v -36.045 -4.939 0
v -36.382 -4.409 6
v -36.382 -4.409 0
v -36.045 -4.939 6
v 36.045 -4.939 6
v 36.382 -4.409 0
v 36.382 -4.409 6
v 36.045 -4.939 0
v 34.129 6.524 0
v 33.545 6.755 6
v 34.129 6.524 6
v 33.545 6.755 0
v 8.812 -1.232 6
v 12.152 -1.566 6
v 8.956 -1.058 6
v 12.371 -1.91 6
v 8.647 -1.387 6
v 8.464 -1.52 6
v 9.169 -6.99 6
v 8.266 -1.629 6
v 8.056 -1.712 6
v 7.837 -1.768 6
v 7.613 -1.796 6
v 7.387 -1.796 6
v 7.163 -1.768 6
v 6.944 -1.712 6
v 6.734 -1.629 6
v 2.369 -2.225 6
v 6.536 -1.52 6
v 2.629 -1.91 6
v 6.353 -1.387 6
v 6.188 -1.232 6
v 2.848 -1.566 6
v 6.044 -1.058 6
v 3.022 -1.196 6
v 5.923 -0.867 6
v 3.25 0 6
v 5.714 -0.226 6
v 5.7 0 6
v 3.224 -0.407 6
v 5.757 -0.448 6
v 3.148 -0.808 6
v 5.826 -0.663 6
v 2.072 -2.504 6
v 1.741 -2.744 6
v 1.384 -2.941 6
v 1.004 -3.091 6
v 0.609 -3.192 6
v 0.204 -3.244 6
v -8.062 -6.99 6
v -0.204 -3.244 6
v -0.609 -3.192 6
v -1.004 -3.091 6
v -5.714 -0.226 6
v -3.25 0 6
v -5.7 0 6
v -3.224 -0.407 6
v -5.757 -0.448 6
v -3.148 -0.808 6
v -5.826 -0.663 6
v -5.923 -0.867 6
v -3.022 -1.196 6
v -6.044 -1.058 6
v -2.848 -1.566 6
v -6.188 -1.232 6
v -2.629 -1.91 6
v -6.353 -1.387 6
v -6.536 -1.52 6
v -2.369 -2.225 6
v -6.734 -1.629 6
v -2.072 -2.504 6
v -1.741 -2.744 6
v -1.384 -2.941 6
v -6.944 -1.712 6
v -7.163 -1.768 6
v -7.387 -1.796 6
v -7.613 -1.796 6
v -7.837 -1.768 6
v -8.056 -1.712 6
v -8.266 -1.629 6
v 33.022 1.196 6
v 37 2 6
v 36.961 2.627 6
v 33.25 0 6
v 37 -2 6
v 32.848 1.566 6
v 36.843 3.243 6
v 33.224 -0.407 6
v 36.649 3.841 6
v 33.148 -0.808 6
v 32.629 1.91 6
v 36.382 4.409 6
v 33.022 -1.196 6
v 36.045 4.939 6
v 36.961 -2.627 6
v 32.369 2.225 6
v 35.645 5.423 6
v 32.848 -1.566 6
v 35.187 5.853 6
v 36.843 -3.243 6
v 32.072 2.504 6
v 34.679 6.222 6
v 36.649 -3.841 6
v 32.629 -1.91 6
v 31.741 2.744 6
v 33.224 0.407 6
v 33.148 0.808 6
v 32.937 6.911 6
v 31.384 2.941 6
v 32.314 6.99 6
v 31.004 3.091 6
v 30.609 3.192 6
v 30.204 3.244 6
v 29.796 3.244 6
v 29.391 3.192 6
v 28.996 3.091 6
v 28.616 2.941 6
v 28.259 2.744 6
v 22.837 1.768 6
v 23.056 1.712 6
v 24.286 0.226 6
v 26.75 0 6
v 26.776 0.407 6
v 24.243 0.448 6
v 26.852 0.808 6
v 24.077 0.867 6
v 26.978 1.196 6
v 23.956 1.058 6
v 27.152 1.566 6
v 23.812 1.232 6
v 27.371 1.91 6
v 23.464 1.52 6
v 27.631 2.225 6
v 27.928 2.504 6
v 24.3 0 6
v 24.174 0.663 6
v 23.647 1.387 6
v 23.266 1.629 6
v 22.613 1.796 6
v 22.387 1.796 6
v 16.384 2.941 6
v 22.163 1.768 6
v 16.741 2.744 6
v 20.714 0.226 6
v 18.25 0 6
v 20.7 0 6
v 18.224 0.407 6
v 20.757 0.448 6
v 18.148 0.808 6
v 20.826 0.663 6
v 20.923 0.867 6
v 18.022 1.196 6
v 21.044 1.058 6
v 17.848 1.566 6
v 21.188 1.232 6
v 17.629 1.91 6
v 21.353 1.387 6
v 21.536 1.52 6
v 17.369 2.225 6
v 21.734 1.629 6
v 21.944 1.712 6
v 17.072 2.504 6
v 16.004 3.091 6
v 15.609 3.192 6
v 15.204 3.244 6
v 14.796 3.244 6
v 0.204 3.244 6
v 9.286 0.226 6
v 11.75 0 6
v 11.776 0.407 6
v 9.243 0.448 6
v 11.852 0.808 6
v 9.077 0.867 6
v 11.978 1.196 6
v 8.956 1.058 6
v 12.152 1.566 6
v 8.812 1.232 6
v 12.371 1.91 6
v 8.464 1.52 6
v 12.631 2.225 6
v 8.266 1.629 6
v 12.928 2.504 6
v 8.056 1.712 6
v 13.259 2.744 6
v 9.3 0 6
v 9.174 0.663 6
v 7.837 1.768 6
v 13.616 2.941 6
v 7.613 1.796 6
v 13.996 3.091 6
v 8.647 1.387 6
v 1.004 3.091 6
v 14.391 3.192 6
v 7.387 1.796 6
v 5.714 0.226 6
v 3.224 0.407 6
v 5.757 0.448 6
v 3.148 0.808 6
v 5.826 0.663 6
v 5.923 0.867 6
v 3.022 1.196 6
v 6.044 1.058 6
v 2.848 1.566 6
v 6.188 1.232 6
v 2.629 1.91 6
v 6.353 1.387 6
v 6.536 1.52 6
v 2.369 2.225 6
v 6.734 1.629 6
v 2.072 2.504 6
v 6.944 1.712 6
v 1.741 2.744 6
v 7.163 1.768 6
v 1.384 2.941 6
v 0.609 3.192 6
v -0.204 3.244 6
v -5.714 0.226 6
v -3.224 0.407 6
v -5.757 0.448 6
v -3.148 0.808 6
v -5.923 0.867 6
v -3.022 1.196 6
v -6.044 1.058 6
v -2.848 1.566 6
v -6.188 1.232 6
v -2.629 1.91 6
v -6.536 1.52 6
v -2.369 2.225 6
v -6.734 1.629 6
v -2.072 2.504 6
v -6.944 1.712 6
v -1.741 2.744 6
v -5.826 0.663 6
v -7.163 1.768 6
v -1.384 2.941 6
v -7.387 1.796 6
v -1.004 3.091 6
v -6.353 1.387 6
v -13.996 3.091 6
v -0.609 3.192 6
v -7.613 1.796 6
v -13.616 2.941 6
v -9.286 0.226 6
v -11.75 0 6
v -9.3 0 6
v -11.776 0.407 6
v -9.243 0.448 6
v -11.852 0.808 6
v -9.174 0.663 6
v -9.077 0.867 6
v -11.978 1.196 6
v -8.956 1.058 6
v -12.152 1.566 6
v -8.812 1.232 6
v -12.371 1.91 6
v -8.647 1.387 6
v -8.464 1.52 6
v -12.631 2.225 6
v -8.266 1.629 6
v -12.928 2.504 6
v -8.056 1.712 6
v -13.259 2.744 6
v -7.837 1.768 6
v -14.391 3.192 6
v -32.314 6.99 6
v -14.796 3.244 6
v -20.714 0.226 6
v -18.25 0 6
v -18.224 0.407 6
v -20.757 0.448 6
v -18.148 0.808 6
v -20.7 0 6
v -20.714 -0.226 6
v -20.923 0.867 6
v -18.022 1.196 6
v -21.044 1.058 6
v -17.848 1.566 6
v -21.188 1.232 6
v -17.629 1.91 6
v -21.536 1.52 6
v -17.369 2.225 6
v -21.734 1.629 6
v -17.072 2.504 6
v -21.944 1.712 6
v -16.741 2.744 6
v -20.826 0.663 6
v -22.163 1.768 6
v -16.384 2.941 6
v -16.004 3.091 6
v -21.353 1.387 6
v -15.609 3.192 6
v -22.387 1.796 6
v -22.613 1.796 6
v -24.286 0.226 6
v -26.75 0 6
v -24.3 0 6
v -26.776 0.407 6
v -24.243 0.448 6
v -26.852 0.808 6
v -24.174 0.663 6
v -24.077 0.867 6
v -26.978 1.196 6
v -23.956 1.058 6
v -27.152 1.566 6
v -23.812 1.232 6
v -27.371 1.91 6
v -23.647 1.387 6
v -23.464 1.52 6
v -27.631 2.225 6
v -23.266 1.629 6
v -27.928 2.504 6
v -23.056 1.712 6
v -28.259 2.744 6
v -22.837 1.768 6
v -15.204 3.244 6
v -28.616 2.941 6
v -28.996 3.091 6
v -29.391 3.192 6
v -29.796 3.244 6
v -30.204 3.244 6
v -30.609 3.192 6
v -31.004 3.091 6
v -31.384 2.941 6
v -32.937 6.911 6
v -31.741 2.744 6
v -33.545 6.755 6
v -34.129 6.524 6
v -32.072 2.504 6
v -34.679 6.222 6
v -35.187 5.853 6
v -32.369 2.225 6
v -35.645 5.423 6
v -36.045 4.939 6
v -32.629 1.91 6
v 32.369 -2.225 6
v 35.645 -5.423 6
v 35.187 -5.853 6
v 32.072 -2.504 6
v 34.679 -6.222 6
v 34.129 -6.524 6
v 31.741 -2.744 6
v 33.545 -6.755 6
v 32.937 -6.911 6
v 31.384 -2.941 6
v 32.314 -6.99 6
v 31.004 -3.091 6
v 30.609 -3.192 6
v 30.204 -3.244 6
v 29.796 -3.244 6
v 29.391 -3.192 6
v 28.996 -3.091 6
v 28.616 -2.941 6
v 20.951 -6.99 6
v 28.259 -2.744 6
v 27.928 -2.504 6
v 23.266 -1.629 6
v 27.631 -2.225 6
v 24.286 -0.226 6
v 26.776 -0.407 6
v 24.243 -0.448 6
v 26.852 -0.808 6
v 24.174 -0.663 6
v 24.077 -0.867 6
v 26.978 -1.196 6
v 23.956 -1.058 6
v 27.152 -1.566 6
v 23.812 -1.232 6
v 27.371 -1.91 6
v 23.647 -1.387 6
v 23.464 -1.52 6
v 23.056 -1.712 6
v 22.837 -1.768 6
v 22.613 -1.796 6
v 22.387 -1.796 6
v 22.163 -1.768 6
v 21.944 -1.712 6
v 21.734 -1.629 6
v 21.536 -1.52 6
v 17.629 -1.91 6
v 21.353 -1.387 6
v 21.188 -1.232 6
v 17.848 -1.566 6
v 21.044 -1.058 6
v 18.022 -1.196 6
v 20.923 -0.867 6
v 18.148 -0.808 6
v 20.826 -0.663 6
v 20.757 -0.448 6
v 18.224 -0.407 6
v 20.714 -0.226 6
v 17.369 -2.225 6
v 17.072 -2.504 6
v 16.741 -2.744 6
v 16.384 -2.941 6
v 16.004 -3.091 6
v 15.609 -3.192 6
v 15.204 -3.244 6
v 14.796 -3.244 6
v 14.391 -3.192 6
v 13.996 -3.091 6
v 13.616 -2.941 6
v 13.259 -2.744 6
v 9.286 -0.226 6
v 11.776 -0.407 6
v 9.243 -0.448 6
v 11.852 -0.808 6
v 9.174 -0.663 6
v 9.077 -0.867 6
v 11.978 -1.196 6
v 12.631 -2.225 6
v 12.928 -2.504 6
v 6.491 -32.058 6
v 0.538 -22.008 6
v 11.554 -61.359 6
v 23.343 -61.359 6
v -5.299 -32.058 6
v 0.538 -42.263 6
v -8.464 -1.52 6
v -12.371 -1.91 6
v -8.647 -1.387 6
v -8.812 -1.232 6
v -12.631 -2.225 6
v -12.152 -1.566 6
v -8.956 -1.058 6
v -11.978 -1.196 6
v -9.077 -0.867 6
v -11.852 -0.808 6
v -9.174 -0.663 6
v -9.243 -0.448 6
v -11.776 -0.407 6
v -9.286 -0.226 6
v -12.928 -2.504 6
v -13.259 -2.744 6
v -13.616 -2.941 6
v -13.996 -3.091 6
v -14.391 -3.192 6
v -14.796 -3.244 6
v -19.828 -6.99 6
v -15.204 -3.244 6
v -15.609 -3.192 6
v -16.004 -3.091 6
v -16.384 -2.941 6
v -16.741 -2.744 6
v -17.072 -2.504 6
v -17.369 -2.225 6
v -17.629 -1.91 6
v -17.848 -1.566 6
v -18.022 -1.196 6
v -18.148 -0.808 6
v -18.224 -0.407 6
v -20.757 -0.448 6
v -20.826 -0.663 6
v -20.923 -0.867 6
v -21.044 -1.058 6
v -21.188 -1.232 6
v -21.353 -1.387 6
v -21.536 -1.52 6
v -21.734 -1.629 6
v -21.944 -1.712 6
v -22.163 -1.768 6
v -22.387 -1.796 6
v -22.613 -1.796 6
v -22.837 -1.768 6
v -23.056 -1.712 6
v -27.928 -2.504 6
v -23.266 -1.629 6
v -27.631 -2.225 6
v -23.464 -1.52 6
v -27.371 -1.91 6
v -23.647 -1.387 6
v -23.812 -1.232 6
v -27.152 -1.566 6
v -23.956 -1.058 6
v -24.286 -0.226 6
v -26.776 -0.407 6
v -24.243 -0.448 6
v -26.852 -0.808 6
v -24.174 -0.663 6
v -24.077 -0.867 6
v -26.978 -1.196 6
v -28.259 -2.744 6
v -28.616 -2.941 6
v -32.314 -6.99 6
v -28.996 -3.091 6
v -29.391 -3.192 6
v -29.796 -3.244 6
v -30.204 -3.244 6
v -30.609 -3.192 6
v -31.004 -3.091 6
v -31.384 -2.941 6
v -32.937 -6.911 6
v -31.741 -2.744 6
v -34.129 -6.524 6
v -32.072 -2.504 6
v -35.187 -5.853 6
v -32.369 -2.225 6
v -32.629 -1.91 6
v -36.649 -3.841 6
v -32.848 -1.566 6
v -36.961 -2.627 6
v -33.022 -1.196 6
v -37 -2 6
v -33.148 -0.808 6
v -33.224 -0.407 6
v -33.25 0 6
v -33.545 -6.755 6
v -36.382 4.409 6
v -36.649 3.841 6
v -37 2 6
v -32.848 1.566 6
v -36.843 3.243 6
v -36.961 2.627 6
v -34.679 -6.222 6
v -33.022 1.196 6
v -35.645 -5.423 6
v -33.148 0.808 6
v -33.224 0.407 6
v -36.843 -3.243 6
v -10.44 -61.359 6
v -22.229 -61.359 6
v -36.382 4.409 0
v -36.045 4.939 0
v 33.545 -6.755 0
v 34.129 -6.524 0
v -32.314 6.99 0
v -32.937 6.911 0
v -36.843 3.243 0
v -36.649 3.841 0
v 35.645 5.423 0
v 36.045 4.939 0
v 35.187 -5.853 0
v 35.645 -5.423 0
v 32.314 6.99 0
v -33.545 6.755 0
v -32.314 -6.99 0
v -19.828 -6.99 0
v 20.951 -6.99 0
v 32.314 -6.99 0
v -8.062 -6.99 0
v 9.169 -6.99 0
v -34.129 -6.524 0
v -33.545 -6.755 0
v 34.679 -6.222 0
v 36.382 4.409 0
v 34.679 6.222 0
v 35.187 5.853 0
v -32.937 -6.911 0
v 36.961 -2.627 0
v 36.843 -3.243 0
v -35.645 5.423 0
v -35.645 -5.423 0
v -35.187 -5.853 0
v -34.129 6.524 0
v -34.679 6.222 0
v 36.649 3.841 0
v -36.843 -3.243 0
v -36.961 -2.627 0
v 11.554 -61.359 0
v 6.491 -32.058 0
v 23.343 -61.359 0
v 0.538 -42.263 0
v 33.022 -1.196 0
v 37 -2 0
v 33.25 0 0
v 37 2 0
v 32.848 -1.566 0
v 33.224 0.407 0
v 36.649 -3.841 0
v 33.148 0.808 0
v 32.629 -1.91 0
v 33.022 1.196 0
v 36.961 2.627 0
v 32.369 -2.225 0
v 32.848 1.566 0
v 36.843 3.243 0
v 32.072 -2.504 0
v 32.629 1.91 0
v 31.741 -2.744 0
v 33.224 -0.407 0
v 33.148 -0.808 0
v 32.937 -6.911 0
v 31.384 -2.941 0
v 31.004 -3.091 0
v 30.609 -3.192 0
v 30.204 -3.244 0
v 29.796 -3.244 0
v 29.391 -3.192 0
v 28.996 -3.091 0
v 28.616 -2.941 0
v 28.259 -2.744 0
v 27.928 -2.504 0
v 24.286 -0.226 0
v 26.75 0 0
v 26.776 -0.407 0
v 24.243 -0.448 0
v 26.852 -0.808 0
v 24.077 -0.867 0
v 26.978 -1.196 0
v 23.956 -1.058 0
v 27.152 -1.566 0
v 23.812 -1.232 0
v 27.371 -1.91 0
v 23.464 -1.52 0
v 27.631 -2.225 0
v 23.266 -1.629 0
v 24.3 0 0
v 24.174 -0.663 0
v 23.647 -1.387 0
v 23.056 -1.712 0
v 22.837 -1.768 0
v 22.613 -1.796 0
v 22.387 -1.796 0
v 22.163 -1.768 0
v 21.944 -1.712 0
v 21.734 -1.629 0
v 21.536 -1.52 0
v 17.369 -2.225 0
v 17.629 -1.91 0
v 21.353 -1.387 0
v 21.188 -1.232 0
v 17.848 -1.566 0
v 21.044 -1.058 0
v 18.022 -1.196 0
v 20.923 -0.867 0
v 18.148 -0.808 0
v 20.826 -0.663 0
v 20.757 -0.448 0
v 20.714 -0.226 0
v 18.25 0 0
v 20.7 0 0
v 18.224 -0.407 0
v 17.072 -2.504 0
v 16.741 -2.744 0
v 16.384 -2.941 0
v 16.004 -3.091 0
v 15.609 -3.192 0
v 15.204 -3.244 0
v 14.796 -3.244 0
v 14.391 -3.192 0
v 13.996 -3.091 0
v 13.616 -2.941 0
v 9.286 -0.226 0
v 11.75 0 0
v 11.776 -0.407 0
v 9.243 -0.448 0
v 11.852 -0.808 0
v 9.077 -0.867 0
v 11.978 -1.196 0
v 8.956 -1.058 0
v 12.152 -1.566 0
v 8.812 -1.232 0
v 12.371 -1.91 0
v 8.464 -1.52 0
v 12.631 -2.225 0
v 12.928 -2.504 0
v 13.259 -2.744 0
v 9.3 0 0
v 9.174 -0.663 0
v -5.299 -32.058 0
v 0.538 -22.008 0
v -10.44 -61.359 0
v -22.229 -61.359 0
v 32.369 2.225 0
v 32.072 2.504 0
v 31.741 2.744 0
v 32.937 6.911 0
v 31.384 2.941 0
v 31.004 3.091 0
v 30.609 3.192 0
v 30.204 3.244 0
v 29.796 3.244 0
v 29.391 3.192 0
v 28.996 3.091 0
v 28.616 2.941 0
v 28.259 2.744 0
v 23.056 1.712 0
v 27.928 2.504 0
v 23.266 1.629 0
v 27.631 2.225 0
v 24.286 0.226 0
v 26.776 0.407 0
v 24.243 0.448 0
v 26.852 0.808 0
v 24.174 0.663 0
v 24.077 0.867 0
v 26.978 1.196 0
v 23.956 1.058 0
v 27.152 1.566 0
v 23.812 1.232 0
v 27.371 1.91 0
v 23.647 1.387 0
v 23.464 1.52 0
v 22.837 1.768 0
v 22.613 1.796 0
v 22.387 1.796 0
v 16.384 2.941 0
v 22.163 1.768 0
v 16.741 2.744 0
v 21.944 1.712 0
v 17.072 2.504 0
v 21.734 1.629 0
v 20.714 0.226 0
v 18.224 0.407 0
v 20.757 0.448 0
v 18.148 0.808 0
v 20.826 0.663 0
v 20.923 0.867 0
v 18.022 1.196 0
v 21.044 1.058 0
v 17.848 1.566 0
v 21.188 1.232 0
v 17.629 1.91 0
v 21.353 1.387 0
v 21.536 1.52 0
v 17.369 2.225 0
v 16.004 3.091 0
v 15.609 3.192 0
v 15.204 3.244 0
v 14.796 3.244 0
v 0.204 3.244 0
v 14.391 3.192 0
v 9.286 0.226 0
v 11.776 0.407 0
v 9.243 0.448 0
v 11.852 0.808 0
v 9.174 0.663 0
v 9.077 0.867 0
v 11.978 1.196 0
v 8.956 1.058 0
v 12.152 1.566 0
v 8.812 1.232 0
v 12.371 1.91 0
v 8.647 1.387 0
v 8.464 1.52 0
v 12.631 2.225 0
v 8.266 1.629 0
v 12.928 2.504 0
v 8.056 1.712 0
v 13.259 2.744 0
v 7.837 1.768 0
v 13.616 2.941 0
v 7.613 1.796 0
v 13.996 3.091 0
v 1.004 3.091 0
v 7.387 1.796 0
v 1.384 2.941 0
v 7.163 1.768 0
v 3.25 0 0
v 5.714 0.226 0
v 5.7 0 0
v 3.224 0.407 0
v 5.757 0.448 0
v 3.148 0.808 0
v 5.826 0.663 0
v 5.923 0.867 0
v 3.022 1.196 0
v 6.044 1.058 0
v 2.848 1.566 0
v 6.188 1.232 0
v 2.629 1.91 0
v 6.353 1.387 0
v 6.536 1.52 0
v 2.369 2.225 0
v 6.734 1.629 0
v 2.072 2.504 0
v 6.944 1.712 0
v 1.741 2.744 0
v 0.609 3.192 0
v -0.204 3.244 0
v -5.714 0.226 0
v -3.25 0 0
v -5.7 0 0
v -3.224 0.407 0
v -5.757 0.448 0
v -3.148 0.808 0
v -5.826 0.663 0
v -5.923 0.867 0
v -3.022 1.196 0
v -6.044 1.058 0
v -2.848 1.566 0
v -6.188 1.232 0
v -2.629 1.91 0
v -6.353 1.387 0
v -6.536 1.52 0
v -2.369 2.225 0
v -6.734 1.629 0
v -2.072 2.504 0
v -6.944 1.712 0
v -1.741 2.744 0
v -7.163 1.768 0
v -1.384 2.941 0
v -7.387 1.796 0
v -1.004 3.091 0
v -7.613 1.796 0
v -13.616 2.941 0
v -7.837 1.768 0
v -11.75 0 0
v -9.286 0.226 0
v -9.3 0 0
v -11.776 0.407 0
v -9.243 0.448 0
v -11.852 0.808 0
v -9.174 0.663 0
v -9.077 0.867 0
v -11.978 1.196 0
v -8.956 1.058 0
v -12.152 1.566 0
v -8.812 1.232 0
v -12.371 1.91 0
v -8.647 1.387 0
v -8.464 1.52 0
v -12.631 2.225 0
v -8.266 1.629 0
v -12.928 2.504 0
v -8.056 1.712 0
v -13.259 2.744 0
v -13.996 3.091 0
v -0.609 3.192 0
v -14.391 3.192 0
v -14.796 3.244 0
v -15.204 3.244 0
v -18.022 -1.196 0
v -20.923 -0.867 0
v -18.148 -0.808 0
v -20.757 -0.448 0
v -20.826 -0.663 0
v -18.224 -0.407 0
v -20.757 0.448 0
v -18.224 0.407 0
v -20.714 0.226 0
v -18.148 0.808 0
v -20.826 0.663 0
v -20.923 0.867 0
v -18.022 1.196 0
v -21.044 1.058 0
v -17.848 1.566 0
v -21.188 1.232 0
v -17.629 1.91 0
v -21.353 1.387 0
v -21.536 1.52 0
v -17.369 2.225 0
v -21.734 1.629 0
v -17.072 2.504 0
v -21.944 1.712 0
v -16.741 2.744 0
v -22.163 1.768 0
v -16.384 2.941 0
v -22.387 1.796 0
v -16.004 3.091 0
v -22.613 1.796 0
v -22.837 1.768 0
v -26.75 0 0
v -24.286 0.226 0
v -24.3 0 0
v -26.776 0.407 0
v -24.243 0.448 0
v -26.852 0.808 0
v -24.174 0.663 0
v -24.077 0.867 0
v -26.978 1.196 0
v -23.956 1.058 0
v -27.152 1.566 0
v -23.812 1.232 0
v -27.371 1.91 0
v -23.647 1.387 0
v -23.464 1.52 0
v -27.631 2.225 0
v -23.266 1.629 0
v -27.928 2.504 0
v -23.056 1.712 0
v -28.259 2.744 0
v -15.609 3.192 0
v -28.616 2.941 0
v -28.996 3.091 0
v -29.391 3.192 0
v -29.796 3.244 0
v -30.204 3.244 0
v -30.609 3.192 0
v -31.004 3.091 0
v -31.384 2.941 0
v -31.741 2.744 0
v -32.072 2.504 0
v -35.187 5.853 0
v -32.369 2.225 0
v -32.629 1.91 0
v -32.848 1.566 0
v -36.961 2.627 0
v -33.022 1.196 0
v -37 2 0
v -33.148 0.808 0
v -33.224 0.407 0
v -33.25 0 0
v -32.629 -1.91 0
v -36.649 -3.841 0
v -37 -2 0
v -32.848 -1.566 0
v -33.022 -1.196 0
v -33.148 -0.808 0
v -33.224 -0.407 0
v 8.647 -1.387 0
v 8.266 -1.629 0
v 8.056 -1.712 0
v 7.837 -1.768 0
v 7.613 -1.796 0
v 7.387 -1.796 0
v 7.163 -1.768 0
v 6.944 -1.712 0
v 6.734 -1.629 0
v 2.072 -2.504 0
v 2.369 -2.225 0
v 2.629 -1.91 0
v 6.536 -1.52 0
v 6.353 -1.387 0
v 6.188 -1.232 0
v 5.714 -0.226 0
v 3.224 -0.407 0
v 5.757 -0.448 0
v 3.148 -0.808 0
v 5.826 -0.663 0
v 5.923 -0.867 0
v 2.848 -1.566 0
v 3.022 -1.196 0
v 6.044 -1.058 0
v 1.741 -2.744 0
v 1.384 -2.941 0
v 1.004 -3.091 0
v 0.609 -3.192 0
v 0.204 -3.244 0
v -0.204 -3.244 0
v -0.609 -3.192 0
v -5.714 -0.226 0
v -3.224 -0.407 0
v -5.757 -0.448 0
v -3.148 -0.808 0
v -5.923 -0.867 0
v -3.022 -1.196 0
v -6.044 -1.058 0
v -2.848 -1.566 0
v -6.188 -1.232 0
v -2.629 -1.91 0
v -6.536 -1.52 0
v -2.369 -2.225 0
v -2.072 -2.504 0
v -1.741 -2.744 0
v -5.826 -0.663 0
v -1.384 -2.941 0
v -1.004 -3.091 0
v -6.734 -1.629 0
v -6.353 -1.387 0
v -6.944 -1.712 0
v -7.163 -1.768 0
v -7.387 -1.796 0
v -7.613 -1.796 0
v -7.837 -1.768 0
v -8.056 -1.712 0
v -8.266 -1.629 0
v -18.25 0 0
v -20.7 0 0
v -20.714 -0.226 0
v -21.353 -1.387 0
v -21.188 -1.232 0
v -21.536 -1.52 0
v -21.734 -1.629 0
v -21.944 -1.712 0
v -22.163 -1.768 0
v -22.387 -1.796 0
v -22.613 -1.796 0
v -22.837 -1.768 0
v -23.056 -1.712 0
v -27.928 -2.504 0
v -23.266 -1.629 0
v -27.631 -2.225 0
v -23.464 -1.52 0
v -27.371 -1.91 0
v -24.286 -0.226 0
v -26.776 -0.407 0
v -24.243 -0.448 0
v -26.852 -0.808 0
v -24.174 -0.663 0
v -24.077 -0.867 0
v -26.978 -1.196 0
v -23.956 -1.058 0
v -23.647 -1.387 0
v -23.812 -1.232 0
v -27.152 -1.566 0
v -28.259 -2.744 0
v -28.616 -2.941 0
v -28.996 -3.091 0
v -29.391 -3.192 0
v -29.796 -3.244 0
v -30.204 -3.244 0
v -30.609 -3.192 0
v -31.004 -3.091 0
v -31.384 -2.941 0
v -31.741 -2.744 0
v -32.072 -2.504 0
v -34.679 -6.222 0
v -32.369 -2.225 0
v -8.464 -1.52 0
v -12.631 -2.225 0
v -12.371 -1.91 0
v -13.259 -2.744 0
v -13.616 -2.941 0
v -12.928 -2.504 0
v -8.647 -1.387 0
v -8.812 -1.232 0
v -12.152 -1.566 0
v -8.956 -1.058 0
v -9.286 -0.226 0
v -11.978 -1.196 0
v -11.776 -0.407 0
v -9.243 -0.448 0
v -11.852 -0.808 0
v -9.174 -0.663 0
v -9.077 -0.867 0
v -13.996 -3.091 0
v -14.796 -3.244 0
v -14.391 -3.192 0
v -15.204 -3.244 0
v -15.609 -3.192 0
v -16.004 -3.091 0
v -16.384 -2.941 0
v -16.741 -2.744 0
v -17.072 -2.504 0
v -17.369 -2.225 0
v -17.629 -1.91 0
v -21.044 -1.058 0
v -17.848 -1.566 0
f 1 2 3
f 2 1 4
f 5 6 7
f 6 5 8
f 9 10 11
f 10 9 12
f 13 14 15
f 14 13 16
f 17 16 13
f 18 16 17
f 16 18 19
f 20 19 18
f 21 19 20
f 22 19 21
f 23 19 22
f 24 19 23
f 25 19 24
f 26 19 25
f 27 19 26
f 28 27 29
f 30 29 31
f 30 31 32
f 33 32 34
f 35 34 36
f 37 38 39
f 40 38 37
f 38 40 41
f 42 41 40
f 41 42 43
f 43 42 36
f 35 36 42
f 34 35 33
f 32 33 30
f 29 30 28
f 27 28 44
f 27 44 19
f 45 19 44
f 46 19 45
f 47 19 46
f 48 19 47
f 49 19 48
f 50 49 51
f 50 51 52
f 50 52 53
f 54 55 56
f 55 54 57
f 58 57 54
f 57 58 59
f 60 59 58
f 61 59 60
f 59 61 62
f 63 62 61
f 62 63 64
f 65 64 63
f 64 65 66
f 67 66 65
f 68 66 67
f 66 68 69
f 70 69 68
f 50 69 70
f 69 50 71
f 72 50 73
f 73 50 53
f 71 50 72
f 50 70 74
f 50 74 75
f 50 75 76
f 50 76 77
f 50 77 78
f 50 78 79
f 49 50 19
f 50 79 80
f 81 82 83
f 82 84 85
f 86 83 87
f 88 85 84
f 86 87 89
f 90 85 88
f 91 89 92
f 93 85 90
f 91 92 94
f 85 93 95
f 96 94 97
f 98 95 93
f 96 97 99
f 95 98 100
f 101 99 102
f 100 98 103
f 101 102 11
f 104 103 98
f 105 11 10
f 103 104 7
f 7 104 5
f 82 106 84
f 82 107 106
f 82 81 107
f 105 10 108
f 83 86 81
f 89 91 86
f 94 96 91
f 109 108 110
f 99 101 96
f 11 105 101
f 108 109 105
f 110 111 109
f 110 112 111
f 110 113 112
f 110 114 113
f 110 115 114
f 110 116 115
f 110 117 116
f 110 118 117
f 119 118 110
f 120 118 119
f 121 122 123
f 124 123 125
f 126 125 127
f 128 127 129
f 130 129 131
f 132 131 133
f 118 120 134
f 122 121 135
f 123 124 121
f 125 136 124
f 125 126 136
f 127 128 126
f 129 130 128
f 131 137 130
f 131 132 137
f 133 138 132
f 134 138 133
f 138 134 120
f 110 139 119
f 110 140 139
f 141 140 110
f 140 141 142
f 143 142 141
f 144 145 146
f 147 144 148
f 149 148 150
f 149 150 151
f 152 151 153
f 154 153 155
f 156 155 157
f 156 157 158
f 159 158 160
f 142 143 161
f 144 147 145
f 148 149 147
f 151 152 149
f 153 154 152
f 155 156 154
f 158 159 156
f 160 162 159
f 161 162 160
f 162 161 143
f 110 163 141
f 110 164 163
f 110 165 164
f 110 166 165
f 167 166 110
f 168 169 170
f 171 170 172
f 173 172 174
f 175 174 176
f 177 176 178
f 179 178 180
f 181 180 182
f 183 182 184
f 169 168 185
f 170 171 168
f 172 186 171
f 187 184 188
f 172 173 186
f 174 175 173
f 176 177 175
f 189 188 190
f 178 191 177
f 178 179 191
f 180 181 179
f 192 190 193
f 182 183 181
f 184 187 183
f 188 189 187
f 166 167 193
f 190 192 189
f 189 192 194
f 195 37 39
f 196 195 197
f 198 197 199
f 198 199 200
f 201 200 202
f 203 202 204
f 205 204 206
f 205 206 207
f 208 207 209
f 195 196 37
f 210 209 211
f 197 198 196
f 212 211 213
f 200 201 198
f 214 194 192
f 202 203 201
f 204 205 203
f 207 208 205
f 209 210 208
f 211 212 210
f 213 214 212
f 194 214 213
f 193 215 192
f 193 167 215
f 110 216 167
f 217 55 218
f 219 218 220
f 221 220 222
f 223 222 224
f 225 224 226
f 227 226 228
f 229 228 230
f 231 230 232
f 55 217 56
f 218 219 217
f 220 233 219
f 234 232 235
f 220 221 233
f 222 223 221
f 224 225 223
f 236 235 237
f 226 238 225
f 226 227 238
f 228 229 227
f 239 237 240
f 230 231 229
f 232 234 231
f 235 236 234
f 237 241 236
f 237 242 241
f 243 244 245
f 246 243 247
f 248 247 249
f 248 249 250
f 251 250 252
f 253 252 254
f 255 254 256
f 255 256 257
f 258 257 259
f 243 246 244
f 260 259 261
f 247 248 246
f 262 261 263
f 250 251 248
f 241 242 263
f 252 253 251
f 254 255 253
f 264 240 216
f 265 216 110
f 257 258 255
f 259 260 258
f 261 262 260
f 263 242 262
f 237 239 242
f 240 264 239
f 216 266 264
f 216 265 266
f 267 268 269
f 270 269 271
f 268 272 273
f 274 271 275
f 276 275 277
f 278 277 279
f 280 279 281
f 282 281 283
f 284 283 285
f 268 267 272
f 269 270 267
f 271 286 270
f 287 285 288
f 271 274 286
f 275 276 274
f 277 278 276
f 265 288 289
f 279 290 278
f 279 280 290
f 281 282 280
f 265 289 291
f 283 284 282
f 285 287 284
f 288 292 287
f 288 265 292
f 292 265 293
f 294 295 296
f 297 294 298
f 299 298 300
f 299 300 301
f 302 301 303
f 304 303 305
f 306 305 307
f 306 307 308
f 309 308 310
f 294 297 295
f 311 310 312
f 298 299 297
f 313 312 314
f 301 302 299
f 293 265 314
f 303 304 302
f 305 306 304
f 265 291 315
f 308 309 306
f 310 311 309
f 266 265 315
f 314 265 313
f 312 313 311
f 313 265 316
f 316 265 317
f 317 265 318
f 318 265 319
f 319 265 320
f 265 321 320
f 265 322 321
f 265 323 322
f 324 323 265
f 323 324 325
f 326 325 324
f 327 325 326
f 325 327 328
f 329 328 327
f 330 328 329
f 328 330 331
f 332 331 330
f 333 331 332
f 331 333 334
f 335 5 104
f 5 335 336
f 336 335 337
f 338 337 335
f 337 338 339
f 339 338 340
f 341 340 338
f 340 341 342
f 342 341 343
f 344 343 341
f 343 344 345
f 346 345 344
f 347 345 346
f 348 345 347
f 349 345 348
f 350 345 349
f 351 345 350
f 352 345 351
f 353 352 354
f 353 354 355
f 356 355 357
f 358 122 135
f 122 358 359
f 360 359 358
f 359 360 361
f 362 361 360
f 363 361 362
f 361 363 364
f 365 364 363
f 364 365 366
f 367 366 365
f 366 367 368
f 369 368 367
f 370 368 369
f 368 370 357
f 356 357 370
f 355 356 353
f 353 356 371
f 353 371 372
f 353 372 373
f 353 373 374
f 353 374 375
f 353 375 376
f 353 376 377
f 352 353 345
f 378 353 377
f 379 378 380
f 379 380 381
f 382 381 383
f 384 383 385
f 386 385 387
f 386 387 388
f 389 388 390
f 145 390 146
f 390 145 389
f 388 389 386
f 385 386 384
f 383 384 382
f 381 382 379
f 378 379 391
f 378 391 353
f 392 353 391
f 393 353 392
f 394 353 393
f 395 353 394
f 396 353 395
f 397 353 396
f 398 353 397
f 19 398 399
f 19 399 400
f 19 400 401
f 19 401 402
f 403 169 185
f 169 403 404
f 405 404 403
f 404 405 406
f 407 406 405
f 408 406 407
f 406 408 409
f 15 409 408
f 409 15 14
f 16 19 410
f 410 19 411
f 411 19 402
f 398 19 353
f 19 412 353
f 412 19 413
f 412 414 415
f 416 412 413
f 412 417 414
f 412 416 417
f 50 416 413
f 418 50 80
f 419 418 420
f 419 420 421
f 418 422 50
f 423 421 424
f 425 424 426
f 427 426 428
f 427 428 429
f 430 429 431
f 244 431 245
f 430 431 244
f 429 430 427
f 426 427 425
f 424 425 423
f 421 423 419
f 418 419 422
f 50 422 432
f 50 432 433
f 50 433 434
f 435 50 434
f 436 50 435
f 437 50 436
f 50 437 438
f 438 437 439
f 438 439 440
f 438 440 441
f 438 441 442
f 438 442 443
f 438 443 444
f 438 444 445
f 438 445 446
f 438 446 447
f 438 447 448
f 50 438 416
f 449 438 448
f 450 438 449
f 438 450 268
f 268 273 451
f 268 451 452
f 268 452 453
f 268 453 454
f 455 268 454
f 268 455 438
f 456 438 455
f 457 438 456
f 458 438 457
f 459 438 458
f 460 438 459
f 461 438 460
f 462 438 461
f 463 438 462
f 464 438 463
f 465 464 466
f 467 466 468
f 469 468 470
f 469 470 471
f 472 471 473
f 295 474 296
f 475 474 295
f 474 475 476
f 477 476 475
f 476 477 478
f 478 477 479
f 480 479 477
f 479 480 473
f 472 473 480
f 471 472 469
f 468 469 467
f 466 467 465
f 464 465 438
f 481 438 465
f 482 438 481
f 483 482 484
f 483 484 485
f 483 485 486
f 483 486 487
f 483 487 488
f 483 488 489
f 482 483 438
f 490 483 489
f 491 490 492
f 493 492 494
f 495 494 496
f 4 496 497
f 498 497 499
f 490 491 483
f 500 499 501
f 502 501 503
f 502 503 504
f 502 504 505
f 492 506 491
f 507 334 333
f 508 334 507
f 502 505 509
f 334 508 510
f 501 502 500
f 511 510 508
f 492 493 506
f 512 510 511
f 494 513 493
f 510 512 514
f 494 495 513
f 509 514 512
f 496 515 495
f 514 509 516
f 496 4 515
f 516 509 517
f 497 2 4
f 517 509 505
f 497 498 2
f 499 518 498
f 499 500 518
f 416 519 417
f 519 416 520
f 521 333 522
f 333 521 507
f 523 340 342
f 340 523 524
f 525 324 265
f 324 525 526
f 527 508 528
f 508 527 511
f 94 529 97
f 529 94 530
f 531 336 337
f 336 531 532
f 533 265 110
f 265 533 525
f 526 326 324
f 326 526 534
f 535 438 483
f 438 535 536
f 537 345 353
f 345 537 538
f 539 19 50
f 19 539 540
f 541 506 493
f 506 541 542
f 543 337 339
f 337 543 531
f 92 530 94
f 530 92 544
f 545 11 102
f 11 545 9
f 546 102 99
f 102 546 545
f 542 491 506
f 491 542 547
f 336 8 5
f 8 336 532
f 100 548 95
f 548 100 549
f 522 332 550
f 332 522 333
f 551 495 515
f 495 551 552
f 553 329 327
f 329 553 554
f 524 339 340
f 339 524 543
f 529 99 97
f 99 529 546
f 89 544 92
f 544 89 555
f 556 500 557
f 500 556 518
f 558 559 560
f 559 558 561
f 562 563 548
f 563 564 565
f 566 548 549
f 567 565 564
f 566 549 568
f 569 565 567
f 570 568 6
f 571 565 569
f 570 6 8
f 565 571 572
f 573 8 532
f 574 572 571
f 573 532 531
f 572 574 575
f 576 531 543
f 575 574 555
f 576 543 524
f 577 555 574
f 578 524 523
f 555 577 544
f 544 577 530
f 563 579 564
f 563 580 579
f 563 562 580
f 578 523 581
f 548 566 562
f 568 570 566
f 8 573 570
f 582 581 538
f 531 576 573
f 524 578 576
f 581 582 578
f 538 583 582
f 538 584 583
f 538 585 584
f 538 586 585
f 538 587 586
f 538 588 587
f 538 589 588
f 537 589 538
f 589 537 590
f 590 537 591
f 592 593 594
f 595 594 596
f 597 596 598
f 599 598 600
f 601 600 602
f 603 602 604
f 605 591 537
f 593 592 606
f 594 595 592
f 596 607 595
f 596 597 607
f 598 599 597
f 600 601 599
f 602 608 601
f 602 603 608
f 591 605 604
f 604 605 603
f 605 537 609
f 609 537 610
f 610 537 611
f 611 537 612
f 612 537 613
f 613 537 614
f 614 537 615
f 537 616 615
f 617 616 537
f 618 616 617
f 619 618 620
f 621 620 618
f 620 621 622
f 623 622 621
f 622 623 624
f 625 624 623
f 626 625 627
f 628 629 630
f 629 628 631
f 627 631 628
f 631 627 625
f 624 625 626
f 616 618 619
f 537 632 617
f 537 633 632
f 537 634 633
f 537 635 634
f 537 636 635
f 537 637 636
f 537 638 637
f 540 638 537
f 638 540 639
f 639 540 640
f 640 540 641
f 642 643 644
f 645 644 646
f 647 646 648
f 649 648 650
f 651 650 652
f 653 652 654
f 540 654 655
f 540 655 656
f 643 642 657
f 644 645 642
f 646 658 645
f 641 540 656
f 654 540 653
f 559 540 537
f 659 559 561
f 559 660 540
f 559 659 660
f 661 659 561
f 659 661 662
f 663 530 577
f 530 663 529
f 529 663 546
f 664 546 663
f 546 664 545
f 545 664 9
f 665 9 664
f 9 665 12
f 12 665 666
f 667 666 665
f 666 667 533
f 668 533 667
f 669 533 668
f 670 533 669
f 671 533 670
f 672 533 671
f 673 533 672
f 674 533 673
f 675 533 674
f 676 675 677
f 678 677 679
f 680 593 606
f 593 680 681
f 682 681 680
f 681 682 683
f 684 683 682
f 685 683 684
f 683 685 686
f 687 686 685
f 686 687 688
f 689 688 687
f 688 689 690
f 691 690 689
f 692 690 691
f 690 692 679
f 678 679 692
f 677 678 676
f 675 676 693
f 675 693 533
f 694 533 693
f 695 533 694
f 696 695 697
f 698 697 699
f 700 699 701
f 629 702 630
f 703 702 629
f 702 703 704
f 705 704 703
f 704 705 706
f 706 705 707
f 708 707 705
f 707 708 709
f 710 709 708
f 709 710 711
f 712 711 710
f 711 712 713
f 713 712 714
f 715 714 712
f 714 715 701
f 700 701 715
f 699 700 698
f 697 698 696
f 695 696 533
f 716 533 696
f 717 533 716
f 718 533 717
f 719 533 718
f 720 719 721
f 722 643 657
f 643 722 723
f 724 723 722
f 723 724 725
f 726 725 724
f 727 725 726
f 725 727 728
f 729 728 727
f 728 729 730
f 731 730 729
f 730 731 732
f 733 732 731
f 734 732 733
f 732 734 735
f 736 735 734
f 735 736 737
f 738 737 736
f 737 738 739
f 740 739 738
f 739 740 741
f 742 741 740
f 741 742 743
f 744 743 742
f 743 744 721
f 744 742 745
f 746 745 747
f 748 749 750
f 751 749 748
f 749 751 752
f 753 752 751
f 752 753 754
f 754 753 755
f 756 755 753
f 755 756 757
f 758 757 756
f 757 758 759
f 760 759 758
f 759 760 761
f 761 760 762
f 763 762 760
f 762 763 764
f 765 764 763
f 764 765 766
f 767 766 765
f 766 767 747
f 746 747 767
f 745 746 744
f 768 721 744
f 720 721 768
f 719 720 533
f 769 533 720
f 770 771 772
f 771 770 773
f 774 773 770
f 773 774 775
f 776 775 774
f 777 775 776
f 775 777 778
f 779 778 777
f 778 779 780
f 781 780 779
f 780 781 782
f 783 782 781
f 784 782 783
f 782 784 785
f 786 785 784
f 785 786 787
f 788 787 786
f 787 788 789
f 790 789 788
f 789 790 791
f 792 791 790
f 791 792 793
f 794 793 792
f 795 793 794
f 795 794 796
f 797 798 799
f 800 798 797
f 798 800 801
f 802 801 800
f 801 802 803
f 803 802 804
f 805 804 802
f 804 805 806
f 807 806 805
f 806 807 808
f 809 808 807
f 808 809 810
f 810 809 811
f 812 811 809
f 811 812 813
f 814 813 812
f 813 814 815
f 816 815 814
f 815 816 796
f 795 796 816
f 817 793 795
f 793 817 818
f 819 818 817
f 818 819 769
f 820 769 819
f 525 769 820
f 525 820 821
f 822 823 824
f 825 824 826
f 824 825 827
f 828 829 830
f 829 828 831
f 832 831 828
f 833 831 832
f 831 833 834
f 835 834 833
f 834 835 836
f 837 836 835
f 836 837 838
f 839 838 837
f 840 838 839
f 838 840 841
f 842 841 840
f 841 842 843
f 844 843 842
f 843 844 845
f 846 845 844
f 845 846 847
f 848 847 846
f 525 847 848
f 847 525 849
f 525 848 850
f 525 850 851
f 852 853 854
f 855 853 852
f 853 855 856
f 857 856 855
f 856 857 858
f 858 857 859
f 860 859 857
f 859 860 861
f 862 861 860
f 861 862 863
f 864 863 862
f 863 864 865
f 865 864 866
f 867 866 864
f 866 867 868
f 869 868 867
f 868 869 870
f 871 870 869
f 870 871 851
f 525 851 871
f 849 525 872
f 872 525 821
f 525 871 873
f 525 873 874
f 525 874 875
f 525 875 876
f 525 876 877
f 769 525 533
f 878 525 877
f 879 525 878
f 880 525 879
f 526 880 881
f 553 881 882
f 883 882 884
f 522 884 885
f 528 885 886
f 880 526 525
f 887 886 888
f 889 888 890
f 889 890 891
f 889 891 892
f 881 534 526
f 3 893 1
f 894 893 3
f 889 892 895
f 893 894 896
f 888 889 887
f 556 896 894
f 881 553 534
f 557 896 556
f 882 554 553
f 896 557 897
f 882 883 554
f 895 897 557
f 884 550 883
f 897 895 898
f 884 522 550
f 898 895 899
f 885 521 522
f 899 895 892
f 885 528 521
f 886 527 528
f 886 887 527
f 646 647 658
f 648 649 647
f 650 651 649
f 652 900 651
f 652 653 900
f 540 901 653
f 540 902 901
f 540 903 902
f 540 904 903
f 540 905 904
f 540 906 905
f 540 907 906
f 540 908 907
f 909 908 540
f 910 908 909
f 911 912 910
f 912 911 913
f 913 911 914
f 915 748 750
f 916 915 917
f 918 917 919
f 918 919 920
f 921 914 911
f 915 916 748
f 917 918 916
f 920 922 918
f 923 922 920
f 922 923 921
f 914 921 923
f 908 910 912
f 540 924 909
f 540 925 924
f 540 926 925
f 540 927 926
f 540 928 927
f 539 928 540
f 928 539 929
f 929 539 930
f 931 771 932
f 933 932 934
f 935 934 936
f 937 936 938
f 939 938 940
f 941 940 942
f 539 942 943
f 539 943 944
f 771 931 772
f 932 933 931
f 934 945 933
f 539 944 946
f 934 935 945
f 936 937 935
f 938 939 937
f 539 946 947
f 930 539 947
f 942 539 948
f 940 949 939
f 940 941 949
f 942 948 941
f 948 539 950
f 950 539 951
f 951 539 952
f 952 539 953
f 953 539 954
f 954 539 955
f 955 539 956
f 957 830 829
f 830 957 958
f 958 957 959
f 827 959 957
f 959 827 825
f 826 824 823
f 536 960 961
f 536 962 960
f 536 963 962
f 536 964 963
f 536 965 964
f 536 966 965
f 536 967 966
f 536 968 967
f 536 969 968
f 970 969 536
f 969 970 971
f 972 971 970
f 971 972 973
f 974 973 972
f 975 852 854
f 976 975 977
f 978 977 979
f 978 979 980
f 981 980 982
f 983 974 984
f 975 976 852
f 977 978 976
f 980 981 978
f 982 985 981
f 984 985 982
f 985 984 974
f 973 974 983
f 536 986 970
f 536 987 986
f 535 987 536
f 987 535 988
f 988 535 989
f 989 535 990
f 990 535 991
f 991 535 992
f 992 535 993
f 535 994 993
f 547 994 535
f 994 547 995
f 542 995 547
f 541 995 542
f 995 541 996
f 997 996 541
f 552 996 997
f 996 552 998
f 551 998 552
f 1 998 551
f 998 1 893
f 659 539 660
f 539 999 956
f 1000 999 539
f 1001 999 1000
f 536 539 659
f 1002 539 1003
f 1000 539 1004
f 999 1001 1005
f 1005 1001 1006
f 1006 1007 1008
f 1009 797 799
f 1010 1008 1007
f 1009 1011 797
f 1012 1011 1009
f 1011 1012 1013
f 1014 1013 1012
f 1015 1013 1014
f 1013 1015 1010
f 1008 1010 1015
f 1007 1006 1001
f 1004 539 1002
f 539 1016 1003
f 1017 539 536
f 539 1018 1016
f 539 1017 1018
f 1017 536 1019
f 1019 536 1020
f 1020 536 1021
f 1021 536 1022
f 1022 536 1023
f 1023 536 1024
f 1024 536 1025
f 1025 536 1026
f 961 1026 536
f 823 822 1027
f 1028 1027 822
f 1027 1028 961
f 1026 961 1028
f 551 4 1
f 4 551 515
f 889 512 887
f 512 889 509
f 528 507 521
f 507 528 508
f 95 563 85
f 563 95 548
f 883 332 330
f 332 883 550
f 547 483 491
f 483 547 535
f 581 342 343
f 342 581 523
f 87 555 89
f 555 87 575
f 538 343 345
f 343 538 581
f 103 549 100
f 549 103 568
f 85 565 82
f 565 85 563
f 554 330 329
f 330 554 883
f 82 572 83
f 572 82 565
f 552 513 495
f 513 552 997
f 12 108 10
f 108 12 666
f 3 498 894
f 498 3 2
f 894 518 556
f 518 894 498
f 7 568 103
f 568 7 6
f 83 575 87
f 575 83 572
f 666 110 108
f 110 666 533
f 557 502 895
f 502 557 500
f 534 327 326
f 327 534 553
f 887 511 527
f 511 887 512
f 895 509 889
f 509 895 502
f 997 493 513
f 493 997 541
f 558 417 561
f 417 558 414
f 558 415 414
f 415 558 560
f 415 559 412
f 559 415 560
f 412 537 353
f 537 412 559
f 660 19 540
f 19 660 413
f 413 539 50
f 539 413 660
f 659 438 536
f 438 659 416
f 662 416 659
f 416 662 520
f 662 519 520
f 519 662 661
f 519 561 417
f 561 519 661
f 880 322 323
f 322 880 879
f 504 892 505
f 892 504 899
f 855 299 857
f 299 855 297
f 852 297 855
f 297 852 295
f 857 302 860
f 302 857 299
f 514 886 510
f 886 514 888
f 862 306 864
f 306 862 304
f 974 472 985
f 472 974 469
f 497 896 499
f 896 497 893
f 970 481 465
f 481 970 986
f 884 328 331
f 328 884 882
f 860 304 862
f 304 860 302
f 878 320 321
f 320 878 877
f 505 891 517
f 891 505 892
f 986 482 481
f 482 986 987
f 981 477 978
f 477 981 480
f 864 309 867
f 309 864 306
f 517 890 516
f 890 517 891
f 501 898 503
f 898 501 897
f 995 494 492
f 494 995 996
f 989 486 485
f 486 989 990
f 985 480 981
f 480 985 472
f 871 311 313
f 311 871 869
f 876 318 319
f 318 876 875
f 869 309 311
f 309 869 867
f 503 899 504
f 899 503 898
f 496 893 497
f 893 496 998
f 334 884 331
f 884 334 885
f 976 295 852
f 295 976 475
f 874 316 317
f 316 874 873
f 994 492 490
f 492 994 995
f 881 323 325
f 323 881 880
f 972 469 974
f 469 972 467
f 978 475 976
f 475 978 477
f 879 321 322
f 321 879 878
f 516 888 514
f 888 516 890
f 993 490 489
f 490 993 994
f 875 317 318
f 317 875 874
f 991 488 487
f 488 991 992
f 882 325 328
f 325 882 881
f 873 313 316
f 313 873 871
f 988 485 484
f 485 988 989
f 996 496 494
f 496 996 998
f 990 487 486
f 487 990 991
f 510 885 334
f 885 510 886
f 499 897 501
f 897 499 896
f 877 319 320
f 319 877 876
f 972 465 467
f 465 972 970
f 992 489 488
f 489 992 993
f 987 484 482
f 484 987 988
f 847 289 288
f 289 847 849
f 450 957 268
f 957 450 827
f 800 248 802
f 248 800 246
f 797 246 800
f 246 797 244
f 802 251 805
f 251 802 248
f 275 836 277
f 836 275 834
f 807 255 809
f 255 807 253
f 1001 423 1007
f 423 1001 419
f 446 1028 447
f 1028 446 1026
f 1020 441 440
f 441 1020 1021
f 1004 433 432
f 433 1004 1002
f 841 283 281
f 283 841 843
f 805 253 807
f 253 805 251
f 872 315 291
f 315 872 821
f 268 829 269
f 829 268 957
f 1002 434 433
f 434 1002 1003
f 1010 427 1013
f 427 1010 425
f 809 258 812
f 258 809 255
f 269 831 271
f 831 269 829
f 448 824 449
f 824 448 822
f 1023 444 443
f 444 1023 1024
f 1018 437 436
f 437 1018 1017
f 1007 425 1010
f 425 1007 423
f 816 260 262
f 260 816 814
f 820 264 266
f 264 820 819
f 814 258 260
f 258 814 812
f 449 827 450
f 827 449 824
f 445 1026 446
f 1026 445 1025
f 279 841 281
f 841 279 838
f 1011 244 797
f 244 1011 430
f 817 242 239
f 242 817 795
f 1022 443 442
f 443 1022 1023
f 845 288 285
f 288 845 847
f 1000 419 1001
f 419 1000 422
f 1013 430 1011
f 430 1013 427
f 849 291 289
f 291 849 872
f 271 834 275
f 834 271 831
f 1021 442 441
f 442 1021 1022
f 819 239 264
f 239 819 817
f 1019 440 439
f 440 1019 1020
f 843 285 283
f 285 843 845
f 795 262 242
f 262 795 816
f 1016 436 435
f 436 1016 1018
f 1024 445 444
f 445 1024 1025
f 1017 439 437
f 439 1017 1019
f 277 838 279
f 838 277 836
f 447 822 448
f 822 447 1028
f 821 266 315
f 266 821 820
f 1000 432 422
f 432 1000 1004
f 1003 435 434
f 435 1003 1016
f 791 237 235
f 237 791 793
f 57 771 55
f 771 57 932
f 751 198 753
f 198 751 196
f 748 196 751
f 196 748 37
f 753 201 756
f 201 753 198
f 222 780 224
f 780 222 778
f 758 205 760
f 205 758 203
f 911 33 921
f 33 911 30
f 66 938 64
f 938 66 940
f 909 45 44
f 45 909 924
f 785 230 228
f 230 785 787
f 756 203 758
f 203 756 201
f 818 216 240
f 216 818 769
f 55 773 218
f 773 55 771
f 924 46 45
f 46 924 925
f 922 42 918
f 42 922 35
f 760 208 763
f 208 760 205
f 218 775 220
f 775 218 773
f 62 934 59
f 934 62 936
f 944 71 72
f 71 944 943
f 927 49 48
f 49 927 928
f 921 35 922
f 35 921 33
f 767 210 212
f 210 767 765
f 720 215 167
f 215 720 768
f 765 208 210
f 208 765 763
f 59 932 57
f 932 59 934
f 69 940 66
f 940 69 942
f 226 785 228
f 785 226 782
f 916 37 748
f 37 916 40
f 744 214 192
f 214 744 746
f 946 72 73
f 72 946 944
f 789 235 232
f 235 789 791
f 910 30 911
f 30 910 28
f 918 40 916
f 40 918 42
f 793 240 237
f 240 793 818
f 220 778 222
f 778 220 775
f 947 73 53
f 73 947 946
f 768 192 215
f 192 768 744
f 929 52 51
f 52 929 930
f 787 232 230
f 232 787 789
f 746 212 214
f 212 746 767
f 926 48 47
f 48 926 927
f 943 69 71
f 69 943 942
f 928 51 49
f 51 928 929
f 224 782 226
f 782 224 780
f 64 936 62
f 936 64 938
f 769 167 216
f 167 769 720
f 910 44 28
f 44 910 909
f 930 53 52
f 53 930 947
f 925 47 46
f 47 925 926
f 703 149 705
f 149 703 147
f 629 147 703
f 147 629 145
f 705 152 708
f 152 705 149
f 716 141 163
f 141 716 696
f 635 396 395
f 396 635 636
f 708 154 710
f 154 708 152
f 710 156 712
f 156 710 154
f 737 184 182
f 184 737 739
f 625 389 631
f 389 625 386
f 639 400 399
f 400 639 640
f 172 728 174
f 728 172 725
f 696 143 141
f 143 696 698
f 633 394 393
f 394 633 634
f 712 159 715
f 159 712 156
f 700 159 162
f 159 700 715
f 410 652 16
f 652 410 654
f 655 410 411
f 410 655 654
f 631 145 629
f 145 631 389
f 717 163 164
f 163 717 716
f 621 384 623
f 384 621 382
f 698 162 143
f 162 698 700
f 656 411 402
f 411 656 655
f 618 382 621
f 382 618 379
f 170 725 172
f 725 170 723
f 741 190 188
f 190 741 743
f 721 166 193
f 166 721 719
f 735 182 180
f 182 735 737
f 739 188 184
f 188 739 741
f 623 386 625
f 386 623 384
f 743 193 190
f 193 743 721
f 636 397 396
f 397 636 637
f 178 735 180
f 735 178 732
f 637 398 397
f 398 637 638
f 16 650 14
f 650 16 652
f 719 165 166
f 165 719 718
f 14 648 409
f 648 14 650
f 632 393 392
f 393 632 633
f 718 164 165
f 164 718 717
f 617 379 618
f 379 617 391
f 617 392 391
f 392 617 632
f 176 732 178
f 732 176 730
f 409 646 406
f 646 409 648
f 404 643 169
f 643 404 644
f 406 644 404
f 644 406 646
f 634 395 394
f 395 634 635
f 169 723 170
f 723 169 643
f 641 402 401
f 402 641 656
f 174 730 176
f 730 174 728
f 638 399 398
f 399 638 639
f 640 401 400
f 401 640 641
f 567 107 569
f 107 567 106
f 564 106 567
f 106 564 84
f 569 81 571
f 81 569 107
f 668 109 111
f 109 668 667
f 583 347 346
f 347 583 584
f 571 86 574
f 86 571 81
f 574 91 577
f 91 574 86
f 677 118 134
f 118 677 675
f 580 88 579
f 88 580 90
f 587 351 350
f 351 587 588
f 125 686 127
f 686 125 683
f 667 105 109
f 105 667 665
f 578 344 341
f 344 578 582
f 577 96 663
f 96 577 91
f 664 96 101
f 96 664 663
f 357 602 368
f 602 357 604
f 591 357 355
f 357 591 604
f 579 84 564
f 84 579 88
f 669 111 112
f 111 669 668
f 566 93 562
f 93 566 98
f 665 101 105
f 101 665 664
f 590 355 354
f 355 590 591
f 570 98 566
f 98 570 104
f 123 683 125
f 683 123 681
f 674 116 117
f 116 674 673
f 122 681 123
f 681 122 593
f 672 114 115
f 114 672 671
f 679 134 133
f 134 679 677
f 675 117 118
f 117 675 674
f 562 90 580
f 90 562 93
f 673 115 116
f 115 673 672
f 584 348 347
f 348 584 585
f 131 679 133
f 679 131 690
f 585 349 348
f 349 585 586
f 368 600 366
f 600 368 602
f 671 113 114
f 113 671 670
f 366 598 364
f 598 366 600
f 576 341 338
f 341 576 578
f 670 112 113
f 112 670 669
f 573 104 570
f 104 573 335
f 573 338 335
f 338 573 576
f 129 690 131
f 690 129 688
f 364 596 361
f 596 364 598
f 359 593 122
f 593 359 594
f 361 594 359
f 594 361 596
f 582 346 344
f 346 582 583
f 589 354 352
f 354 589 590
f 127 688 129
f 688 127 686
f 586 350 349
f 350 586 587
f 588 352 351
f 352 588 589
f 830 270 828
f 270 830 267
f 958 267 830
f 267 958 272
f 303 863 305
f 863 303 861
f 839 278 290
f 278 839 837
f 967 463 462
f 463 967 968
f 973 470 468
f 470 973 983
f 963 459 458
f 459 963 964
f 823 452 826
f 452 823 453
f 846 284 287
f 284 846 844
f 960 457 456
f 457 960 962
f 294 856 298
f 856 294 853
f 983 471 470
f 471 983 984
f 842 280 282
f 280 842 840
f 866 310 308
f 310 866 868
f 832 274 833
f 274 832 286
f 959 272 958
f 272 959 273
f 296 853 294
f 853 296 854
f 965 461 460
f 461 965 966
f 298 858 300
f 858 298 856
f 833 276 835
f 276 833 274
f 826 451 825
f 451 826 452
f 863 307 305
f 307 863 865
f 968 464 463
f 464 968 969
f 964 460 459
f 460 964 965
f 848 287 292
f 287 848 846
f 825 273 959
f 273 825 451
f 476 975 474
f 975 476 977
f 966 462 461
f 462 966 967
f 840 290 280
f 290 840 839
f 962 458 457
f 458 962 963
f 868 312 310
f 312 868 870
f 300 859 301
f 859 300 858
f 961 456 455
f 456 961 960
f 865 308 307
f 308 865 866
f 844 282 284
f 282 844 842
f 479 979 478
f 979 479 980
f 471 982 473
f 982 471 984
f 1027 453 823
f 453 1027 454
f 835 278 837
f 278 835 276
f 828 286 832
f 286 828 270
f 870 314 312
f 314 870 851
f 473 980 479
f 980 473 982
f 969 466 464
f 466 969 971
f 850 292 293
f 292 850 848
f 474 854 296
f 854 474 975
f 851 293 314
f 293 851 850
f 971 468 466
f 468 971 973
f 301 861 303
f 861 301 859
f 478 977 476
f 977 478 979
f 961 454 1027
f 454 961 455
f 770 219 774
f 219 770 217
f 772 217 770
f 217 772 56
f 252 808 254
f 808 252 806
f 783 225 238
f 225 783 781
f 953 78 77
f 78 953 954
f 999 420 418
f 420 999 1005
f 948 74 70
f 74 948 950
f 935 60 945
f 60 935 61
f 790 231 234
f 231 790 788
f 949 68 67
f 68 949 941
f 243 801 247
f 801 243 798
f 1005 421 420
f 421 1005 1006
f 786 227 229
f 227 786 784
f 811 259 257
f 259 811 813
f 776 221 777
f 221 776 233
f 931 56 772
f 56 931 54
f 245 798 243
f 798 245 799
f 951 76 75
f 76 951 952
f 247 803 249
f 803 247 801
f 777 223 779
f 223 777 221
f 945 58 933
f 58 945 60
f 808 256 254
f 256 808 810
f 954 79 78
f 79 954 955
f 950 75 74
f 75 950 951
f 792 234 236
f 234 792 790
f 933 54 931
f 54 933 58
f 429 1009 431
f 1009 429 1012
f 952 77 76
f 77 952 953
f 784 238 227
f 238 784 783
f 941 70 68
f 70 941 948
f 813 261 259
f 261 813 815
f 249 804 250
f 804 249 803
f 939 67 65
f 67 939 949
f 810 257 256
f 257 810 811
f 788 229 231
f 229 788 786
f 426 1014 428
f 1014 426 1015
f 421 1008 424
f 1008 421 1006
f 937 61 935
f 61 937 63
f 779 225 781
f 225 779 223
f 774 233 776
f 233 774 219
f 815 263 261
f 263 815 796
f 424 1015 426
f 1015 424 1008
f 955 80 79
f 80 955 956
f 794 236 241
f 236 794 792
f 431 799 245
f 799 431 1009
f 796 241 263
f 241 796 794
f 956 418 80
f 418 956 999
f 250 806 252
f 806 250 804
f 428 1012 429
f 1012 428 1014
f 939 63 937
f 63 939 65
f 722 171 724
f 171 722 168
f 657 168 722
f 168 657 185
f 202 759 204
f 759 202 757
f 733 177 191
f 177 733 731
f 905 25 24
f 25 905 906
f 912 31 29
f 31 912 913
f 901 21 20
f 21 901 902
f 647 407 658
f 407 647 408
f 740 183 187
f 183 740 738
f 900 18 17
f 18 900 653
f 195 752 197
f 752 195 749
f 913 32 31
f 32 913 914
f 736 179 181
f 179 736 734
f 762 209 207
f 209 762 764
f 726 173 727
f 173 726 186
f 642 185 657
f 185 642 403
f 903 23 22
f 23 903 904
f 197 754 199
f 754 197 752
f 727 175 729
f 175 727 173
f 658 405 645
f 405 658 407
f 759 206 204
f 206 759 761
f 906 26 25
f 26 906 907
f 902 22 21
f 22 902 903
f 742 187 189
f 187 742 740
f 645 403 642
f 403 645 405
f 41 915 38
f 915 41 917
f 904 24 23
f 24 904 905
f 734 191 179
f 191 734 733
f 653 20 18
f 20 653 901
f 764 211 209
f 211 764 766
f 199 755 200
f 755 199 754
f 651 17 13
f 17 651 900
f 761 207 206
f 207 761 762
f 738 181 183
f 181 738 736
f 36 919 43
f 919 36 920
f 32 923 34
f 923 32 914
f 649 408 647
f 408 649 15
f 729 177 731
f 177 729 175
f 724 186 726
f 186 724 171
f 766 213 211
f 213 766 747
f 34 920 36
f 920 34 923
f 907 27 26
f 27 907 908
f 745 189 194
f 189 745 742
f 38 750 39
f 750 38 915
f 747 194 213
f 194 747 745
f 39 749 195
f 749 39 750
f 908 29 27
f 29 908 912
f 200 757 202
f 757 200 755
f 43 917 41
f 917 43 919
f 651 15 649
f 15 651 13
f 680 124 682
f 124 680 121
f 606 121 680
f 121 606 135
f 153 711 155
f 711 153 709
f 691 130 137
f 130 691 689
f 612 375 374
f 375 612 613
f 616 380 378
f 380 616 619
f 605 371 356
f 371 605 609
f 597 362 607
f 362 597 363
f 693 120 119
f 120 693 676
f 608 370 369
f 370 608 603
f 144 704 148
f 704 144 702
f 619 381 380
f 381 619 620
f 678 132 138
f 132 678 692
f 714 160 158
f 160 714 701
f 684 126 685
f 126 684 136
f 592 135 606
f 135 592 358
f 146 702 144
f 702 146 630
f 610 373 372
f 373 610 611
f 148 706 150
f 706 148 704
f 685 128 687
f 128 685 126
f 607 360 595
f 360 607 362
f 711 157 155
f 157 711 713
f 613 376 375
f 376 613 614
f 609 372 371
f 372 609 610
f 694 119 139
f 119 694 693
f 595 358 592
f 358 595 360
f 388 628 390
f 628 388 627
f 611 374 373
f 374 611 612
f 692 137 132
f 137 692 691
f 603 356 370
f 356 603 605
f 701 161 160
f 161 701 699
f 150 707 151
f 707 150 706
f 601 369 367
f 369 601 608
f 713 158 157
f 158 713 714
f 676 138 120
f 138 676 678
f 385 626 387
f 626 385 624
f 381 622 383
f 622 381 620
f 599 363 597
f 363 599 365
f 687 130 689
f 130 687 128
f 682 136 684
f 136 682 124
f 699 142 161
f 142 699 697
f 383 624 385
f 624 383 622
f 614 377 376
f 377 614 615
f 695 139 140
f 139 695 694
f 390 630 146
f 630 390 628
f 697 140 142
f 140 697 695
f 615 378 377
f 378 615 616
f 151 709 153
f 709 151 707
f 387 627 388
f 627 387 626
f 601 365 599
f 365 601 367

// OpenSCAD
$fn = 50;


difference() {
	union() {
		hull() {
			translate(v = [-32.0000000000, 2.0000000000, 0]) {
				cylinder(h = 6, r = 5);
			}
			translate(v = [32.0000000000, 2.0000000000, 0]) {
				cylinder(h = 6, r = 5);
			}
			translate(v = [-32.0000000000, -2.0000000000, 0]) {
				cylinder(h = 6, r = 5);
			}
			translate(v = [32.0000000000, -2.0000000000, 0]) {
				cylinder(h = 6, r = 5);
			}
		}
		translate(v = [0, -5, 0]) {
			linear_extrude(height = 6) {
				text(font = "DejaVu Sans Mono:style=Bold", halign = "center", size = 57.0000000000, text = "X", valign = "top");
			}
		}
	}
	union() {
		translate(v = [-30.0000000000, 0.0000000000, 0]) {
			translate(v = [0, 0, -100]) {
				cylinder(h = 200, r = 3.2500000000);
			}
		}
		translate(v = [-15.0000000000, 0.0000000000, 0]) {
			translate(v = [0, 0, -100]) {
				cylinder(h = 200, r = 3.2500000000);
			}
		}
		translate(v = [0, 0, -100]) {
			cylinder(h = 200, r = 3.2500000000);
		}
		translate(v = [15.0000000000, 0.0000000000, 0]) {
			translate(v = [0, 0, -100]) {
				cylinder(h = 200, r = 3.2500000000);
			}
		}
		translate(v = [30.0000000000, 0.0000000000, 0]) {
			translate(v = [0, 0, -100]) {
				cylinder(h = 200, r = 3.2500000000);
			}
		}
		translate(v = [-30.0000000000, 0.0000000000, 0]) {
			translate(v = [0, 0, -100]) {
				cylinder(h = 200, r = 1.8000000000);
			}
		}
		translate(v = [-22.5000000000, 0.0000000000, 0]) {
			translate(v = [0, 0, -100]) {
				cylinder(h = 200, r = 1.8000000000);
			}
		}
		translate(v = [-15.0000000000, 0.0000000000, 0]) {
			translate(v = [0, 0, -100]) {
				cylinder(h = 200, r = 1.8000000000);
			}
		}
		translate(v = [-7.5000000000, 0.0000000000, 0]) {
			translate(v = [0, 0, -100]) {
				cylinder(h = 200, r = 1.8000000000);
			}
		}
		translate(v = [0, 0, -100]) {
			cylinder(h = 200, r = 1.8000000000);
		}
		translate(v = [7.5000000000, 0.0000000000, 0]) {
			translate(v = [0, 0, -100]) {
				cylinder(h = 200, r = 1.8000000000);
			}
		}
		translate(v = [15.0000000000, 0.0000000000, 0]) {
			translate(v = [0, 0, -100]) {
				cylinder(h = 200, r = 1.8000000000);
			}
		}
		translate(v = [22.5000000000, 0.0000000000, 0]) {
			translate(v = [0, 0, -100]) {
				cylinder(h = 200, r = 1.8000000000);
			}
		}
		translate(v = [30.0000000000, 0.0000000000, 0]) {
			translate(v = [0, 0, -100]) {
				cylinder(h = 200, r = 1.8000000000);
			}
		}
	}
}
